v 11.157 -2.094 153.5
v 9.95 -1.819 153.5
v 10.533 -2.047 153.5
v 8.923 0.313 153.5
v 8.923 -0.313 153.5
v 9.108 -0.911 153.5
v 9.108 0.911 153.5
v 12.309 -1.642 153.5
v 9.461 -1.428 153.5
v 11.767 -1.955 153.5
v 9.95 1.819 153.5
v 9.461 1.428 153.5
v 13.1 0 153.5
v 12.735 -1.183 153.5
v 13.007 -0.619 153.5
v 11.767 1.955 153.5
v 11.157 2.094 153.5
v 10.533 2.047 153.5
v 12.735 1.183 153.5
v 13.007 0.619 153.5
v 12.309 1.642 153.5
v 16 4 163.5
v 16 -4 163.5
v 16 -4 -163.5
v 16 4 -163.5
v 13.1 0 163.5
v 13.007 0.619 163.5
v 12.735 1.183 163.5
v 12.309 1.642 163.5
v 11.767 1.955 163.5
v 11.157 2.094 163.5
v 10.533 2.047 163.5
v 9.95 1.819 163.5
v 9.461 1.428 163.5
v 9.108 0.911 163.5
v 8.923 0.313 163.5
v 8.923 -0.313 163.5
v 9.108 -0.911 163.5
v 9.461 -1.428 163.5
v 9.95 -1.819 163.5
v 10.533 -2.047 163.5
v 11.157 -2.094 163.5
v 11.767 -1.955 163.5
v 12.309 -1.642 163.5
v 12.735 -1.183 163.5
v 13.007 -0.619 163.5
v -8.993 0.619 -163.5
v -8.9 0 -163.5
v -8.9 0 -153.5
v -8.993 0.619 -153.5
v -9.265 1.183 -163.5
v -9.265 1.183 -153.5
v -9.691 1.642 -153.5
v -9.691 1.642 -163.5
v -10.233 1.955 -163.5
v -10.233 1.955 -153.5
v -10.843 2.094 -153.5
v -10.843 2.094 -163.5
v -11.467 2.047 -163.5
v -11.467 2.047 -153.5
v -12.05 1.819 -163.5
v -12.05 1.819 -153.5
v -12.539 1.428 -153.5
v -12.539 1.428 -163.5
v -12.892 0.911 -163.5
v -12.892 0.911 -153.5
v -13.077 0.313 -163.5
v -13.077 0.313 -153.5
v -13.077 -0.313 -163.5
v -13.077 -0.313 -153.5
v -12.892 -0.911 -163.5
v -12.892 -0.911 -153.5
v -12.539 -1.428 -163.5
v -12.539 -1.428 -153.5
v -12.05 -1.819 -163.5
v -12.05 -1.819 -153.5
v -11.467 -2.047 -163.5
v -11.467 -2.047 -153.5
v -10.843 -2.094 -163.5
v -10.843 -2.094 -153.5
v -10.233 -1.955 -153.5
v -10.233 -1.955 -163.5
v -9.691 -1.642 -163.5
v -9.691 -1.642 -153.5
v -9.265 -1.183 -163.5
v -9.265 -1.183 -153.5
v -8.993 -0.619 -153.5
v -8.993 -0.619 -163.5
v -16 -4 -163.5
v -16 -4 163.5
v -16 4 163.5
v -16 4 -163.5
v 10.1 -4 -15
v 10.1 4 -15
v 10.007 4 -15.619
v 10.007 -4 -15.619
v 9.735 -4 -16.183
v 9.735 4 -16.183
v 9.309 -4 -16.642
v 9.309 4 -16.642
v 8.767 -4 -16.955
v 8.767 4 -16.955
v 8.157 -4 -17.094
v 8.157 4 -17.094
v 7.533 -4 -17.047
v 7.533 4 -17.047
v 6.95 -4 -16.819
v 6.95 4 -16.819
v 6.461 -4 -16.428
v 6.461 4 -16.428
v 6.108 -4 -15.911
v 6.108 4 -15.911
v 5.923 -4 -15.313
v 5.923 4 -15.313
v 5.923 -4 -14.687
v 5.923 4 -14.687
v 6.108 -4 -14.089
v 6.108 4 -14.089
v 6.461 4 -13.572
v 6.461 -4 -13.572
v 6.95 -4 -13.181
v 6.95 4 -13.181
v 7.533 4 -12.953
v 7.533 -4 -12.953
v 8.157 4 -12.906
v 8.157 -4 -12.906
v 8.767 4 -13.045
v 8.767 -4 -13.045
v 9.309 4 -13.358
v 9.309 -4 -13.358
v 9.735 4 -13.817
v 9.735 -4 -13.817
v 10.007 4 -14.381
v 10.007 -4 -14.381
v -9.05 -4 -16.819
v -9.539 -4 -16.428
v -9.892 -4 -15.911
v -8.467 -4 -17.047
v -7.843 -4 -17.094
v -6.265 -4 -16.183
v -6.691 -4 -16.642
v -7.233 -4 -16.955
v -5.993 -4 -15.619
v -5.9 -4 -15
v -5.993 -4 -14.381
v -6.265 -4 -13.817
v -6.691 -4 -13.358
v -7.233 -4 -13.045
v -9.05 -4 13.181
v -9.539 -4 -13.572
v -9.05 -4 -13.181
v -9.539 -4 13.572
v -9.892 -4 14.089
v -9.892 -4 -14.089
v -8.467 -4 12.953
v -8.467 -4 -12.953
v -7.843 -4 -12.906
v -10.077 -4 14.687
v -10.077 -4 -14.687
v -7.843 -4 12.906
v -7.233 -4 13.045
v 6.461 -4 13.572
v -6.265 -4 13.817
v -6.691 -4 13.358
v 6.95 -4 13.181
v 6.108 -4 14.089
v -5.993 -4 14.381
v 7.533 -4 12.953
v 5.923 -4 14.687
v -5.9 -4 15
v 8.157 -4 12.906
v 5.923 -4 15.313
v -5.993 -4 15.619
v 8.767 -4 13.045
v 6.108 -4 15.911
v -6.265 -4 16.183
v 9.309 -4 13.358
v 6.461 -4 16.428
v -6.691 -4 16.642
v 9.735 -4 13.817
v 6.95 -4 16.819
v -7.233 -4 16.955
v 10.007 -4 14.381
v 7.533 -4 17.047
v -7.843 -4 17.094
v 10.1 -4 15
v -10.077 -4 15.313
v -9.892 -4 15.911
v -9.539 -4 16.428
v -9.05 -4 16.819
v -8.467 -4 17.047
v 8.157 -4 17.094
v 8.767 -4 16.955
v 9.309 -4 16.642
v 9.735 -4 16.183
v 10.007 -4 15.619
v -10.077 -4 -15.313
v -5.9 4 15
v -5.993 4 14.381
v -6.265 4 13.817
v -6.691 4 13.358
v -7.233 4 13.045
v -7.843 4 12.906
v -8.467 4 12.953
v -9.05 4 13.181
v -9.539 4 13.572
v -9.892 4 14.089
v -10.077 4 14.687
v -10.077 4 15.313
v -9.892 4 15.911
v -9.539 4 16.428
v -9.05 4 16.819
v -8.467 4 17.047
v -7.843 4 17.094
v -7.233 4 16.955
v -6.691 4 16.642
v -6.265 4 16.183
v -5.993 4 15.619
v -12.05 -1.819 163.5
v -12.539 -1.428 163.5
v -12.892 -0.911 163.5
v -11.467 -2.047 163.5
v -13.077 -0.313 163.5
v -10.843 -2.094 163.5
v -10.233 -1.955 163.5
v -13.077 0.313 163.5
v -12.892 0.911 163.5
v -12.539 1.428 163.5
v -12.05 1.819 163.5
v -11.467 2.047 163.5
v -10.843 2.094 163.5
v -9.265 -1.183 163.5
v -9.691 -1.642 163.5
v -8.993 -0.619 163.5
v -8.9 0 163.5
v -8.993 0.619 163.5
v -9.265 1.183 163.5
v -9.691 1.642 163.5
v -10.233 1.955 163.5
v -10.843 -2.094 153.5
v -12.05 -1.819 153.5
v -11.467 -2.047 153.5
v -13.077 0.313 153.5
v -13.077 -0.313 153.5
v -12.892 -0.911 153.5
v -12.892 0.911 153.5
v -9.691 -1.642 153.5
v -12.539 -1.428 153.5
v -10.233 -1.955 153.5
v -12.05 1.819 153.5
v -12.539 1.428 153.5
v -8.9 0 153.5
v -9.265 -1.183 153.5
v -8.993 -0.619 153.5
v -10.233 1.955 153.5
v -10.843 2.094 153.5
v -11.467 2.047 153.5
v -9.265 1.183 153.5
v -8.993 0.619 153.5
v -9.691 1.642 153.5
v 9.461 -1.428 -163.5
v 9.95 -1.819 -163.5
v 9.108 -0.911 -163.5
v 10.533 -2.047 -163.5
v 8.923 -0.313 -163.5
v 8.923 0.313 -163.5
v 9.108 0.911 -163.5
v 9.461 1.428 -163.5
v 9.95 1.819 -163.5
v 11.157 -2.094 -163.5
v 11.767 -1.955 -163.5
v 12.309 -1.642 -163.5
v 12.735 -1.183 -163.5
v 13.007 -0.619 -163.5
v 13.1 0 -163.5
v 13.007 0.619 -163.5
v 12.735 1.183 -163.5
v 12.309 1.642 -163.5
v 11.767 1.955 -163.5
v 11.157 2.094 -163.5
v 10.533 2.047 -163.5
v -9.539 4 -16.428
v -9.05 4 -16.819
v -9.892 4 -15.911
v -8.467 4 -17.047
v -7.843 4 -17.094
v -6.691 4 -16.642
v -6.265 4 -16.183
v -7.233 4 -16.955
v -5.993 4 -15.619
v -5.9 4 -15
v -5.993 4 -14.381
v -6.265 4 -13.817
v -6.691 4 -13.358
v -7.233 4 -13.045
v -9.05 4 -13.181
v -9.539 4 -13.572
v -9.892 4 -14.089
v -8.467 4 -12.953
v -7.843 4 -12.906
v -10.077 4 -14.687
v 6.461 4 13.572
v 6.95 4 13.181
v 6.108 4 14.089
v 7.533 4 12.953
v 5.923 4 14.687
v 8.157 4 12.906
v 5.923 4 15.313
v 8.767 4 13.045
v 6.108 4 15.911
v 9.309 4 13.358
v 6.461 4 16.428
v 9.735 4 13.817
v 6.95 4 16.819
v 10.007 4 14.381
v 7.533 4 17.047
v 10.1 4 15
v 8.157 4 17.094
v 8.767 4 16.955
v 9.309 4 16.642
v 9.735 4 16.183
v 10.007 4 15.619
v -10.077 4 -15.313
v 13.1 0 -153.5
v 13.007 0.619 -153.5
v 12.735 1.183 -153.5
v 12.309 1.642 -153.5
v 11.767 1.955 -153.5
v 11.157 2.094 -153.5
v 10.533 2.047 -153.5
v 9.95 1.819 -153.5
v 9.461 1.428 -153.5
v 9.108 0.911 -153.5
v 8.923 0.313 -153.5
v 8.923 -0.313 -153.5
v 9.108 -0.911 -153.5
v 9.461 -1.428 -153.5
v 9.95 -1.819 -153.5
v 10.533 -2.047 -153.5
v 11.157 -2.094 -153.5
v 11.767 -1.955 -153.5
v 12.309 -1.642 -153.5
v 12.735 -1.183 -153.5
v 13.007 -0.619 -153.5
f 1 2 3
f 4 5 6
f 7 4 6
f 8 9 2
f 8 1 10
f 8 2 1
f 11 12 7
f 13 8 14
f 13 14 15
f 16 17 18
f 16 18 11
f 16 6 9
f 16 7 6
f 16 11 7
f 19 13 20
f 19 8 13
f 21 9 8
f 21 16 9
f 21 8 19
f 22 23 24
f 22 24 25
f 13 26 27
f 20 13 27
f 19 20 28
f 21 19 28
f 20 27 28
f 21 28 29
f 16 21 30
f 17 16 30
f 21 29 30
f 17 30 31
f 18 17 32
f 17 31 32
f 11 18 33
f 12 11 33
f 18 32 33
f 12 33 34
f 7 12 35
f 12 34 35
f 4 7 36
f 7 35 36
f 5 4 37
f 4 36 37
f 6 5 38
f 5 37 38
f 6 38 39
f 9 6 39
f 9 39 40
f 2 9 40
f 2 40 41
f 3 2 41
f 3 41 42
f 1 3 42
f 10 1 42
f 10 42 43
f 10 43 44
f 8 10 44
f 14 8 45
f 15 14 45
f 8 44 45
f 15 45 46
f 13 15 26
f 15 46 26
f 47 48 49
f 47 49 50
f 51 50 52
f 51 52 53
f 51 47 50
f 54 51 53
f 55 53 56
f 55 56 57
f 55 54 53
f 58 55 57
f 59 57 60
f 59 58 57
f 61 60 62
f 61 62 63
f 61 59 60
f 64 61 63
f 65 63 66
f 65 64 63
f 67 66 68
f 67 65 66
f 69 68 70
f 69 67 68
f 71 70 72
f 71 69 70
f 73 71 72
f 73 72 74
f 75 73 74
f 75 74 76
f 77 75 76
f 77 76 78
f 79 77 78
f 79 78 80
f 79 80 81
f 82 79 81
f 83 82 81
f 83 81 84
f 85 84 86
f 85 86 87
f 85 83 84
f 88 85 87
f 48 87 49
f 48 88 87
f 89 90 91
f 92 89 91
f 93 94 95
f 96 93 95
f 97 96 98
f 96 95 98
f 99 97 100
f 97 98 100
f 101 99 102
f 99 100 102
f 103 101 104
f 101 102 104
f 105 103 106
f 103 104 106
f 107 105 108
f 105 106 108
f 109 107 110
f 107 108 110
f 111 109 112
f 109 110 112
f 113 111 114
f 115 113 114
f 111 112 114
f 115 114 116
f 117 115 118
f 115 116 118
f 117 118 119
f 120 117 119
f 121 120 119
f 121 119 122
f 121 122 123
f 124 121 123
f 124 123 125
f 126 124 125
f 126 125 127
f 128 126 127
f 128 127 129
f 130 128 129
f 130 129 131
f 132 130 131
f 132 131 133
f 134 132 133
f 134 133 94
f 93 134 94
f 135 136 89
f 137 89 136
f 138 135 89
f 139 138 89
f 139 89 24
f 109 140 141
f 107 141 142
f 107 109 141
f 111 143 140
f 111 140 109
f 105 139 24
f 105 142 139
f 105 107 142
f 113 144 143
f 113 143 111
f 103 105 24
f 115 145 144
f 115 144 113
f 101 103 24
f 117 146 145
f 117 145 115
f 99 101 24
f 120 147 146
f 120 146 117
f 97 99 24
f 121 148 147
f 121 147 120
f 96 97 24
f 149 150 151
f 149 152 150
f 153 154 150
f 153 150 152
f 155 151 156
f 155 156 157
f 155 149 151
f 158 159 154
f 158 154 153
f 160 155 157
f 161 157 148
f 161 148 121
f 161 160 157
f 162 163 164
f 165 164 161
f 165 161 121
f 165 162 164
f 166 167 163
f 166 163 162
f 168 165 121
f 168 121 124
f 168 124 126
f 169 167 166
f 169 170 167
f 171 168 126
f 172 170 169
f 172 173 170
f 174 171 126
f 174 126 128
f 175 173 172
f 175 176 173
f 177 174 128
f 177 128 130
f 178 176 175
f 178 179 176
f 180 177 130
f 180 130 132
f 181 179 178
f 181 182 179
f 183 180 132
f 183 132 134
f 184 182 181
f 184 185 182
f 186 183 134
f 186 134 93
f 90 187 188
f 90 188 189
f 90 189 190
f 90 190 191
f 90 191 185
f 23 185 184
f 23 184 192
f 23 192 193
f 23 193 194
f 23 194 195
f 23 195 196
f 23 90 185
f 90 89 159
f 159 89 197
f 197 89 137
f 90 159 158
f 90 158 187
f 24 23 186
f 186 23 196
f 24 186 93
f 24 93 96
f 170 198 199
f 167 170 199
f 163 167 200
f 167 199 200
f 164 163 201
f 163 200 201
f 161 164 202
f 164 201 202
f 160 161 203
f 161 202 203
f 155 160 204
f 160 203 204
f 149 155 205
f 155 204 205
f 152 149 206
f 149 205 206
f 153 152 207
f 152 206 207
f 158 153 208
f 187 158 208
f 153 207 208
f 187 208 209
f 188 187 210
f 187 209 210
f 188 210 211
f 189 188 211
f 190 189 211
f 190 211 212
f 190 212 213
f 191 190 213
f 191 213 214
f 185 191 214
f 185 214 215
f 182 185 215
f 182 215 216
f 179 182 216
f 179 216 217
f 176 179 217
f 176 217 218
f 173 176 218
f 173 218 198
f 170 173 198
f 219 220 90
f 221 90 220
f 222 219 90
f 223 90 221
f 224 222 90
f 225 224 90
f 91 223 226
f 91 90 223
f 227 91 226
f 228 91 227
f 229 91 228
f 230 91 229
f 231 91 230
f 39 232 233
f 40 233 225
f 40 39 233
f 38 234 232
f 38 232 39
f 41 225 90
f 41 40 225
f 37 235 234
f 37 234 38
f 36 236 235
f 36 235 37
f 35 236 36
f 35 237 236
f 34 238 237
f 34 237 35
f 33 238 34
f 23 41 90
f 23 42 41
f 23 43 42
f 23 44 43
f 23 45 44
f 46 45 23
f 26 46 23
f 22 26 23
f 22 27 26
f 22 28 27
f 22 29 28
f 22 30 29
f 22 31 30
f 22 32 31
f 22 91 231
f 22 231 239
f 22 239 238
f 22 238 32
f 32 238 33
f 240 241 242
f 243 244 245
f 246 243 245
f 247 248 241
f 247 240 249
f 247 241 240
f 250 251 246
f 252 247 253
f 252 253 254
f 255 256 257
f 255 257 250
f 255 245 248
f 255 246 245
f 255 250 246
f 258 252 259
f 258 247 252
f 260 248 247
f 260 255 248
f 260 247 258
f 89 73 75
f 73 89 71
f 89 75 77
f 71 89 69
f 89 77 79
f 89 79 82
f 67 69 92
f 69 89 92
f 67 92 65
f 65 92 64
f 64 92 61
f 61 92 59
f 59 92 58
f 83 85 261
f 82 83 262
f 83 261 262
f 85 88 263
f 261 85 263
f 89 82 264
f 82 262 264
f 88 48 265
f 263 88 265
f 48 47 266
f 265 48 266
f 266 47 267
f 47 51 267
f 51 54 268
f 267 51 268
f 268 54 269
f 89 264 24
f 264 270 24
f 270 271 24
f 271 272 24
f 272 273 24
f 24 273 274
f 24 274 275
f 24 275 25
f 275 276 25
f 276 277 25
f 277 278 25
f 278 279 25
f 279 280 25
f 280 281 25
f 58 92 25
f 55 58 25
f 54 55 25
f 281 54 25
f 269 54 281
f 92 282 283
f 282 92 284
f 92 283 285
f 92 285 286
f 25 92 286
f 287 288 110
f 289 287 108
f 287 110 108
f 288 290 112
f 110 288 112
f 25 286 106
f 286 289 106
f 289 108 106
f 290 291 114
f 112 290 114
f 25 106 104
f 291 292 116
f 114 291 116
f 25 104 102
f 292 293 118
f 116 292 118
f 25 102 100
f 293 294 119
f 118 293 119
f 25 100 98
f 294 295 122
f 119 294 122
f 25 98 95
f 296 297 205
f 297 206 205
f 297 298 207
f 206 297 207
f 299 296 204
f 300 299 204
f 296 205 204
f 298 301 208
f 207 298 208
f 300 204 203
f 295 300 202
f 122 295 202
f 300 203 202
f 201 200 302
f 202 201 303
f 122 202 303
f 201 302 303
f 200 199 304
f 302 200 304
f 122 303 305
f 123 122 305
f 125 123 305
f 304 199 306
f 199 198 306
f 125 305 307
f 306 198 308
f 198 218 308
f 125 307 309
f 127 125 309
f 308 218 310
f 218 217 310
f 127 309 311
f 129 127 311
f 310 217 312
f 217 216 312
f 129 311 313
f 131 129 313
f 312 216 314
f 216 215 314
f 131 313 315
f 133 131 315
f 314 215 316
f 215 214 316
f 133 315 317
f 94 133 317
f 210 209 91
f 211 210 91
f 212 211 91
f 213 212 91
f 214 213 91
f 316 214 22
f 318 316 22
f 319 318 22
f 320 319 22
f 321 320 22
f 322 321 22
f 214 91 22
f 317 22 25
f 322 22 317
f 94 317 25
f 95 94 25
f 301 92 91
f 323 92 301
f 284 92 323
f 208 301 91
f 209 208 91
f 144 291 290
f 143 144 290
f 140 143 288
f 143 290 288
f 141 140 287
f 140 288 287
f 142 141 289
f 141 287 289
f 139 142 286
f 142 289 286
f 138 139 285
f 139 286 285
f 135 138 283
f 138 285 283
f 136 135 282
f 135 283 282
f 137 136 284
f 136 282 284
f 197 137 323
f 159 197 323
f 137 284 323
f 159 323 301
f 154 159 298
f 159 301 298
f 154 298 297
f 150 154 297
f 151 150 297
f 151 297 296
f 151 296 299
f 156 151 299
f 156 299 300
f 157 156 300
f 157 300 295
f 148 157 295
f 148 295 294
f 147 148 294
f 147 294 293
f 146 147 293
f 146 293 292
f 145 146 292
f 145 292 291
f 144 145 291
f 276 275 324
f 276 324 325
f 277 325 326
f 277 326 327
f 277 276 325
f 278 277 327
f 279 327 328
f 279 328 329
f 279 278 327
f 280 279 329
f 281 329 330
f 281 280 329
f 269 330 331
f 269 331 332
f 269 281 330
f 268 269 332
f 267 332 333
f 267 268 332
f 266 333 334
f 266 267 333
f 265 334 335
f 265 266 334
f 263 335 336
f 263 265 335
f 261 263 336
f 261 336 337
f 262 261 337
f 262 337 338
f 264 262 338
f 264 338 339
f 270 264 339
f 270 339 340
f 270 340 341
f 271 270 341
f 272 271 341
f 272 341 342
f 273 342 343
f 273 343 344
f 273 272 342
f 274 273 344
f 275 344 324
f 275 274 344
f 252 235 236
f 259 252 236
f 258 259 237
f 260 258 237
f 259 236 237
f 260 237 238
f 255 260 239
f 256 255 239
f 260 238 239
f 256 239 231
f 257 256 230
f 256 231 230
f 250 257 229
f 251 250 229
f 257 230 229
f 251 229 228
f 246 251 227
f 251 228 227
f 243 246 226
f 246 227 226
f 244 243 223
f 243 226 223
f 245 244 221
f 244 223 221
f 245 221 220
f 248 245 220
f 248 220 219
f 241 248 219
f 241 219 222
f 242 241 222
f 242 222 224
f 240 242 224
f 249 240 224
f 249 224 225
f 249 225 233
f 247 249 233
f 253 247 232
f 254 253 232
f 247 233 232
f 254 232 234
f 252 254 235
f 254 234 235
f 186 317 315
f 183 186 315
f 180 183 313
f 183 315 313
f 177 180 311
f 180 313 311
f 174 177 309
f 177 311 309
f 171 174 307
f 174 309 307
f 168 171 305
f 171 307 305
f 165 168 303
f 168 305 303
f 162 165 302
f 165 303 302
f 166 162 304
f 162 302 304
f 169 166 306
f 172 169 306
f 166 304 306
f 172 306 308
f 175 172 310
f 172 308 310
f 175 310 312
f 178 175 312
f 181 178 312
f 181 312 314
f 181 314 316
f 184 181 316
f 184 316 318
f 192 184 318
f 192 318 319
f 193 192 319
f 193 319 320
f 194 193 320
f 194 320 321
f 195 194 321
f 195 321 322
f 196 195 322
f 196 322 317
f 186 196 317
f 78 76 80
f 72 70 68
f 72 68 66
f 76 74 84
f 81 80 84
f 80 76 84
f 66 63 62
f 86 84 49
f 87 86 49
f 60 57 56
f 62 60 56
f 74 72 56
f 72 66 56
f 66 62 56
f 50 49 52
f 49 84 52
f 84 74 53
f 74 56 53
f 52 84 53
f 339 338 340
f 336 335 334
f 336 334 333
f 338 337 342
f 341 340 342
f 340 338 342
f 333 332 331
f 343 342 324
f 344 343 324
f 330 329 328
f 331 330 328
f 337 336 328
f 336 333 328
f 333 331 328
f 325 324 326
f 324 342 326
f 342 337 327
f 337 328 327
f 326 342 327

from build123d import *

# Parameters (mm, degrees)
SKETCH1_W           = 32
SKETCH1_H           = 8
BOSS_EXTRUDE1_DEPTH = 163.5
SKETCH2_R           = 2.1
CUT_EXTRUDE1_DEPTH  = 10
CUT_EXTRUDE2_REACH  = 10
SKETCH3_R           = 2.1


with BuildPart() as part:
    # Sketch1 → Boss-Extrude1 (new body, symmetric)
    with BuildSketch(Plane.XY):
        Rectangle(SKETCH1_W, SKETCH1_H)
    extrude(amount=BOSS_EXTRUDE1_DEPTH, both=True)

    # Sketch2 → Cut-Extrude1 (cut)
    with BuildSketch(Plane.XY.offset(163.5)):
        with Locations((11, 0)):
            Circle(SKETCH2_R)
        with Locations((-11, 0)):
            Circle(SKETCH2_R)
    cut_extrude1 = extrude(amount=-CUT_EXTRUDE1_DEPTH, mode=Mode.SUBTRACT)

    # Mirror1: Cut-Extrude1 across plane
    add(cut_extrude1.mirror(Plane.XY), mode=Mode.SUBTRACT)

    # Sketch3 → Cut-Extrude2 (cut, up to next)
    with BuildSketch(Plane(origin=(0, 4, 0), x_dir=(1, 0, 0), z_dir=(0, 1, 0)), mode=Mode.PRIVATE) as cut_extrude2_sk1:
        with Locations((-8, -15)):
            Circle(SKETCH3_R)
    cut_extrude2_tool1 = extrude(cut_extrude2_sk1.sketch, amount=-CUT_EXTRUDE2_REACH, mode=Mode.PRIVATE) & part.part
    add(cut_extrude2_tool1.solids().sort_by_distance((-8, 4, 15))[0], mode=Mode.SUBTRACT)
    # Sketch3 → Cut-Extrude2 (cut, up to next)
    with BuildSketch(Plane(origin=(0, 4, 0), x_dir=(1, 0, 0), z_dir=(0, 1, 0)), mode=Mode.PRIVATE) as cut_extrude2_sk2:
        with Locations((-8, 15)):
            Circle(SKETCH3_R)
    cut_extrude2_tool2 = extrude(cut_extrude2_sk2.sketch, amount=-CUT_EXTRUDE2_REACH, mode=Mode.PRIVATE) & part.part
    add(cut_extrude2_tool2.solids().sort_by_distance((-8, 4, -15))[0], mode=Mode.SUBTRACT)
    # Sketch3 → Cut-Extrude2 (cut, up to next)
    with BuildSketch(Plane(origin=(0, 4, 0), x_dir=(1, 0, 0), z_dir=(0, 1, 0)), mode=Mode.PRIVATE) as cut_extrude2_sk3:
        with Locations((8, -15)):
            Circle(SKETCH3_R)
    cut_extrude2_tool3 = extrude(cut_extrude2_sk3.sketch, amount=-CUT_EXTRUDE2_REACH, mode=Mode.PRIVATE) & part.part
    add(cut_extrude2_tool3.solids().sort_by_distance((8, 4, 15))[0], mode=Mode.SUBTRACT)
    # Sketch3 → Cut-Extrude2 (cut, up to next)
    with BuildSketch(Plane(origin=(0, 4, 0), x_dir=(1, 0, 0), z_dir=(0, 1, 0)), mode=Mode.PRIVATE) as cut_extrude2_sk4:
        with Locations((8, 15)):
            Circle(SKETCH3_R)
    cut_extrude2_tool4 = extrude(cut_extrude2_sk4.sketch, amount=-CUT_EXTRUDE2_REACH, mode=Mode.PRIVATE) & part.part
    add(cut_extrude2_tool4.solids().sort_by_distance((8, 4, -15))[0], mode=Mode.SUBTRACT)


solid = part.part
